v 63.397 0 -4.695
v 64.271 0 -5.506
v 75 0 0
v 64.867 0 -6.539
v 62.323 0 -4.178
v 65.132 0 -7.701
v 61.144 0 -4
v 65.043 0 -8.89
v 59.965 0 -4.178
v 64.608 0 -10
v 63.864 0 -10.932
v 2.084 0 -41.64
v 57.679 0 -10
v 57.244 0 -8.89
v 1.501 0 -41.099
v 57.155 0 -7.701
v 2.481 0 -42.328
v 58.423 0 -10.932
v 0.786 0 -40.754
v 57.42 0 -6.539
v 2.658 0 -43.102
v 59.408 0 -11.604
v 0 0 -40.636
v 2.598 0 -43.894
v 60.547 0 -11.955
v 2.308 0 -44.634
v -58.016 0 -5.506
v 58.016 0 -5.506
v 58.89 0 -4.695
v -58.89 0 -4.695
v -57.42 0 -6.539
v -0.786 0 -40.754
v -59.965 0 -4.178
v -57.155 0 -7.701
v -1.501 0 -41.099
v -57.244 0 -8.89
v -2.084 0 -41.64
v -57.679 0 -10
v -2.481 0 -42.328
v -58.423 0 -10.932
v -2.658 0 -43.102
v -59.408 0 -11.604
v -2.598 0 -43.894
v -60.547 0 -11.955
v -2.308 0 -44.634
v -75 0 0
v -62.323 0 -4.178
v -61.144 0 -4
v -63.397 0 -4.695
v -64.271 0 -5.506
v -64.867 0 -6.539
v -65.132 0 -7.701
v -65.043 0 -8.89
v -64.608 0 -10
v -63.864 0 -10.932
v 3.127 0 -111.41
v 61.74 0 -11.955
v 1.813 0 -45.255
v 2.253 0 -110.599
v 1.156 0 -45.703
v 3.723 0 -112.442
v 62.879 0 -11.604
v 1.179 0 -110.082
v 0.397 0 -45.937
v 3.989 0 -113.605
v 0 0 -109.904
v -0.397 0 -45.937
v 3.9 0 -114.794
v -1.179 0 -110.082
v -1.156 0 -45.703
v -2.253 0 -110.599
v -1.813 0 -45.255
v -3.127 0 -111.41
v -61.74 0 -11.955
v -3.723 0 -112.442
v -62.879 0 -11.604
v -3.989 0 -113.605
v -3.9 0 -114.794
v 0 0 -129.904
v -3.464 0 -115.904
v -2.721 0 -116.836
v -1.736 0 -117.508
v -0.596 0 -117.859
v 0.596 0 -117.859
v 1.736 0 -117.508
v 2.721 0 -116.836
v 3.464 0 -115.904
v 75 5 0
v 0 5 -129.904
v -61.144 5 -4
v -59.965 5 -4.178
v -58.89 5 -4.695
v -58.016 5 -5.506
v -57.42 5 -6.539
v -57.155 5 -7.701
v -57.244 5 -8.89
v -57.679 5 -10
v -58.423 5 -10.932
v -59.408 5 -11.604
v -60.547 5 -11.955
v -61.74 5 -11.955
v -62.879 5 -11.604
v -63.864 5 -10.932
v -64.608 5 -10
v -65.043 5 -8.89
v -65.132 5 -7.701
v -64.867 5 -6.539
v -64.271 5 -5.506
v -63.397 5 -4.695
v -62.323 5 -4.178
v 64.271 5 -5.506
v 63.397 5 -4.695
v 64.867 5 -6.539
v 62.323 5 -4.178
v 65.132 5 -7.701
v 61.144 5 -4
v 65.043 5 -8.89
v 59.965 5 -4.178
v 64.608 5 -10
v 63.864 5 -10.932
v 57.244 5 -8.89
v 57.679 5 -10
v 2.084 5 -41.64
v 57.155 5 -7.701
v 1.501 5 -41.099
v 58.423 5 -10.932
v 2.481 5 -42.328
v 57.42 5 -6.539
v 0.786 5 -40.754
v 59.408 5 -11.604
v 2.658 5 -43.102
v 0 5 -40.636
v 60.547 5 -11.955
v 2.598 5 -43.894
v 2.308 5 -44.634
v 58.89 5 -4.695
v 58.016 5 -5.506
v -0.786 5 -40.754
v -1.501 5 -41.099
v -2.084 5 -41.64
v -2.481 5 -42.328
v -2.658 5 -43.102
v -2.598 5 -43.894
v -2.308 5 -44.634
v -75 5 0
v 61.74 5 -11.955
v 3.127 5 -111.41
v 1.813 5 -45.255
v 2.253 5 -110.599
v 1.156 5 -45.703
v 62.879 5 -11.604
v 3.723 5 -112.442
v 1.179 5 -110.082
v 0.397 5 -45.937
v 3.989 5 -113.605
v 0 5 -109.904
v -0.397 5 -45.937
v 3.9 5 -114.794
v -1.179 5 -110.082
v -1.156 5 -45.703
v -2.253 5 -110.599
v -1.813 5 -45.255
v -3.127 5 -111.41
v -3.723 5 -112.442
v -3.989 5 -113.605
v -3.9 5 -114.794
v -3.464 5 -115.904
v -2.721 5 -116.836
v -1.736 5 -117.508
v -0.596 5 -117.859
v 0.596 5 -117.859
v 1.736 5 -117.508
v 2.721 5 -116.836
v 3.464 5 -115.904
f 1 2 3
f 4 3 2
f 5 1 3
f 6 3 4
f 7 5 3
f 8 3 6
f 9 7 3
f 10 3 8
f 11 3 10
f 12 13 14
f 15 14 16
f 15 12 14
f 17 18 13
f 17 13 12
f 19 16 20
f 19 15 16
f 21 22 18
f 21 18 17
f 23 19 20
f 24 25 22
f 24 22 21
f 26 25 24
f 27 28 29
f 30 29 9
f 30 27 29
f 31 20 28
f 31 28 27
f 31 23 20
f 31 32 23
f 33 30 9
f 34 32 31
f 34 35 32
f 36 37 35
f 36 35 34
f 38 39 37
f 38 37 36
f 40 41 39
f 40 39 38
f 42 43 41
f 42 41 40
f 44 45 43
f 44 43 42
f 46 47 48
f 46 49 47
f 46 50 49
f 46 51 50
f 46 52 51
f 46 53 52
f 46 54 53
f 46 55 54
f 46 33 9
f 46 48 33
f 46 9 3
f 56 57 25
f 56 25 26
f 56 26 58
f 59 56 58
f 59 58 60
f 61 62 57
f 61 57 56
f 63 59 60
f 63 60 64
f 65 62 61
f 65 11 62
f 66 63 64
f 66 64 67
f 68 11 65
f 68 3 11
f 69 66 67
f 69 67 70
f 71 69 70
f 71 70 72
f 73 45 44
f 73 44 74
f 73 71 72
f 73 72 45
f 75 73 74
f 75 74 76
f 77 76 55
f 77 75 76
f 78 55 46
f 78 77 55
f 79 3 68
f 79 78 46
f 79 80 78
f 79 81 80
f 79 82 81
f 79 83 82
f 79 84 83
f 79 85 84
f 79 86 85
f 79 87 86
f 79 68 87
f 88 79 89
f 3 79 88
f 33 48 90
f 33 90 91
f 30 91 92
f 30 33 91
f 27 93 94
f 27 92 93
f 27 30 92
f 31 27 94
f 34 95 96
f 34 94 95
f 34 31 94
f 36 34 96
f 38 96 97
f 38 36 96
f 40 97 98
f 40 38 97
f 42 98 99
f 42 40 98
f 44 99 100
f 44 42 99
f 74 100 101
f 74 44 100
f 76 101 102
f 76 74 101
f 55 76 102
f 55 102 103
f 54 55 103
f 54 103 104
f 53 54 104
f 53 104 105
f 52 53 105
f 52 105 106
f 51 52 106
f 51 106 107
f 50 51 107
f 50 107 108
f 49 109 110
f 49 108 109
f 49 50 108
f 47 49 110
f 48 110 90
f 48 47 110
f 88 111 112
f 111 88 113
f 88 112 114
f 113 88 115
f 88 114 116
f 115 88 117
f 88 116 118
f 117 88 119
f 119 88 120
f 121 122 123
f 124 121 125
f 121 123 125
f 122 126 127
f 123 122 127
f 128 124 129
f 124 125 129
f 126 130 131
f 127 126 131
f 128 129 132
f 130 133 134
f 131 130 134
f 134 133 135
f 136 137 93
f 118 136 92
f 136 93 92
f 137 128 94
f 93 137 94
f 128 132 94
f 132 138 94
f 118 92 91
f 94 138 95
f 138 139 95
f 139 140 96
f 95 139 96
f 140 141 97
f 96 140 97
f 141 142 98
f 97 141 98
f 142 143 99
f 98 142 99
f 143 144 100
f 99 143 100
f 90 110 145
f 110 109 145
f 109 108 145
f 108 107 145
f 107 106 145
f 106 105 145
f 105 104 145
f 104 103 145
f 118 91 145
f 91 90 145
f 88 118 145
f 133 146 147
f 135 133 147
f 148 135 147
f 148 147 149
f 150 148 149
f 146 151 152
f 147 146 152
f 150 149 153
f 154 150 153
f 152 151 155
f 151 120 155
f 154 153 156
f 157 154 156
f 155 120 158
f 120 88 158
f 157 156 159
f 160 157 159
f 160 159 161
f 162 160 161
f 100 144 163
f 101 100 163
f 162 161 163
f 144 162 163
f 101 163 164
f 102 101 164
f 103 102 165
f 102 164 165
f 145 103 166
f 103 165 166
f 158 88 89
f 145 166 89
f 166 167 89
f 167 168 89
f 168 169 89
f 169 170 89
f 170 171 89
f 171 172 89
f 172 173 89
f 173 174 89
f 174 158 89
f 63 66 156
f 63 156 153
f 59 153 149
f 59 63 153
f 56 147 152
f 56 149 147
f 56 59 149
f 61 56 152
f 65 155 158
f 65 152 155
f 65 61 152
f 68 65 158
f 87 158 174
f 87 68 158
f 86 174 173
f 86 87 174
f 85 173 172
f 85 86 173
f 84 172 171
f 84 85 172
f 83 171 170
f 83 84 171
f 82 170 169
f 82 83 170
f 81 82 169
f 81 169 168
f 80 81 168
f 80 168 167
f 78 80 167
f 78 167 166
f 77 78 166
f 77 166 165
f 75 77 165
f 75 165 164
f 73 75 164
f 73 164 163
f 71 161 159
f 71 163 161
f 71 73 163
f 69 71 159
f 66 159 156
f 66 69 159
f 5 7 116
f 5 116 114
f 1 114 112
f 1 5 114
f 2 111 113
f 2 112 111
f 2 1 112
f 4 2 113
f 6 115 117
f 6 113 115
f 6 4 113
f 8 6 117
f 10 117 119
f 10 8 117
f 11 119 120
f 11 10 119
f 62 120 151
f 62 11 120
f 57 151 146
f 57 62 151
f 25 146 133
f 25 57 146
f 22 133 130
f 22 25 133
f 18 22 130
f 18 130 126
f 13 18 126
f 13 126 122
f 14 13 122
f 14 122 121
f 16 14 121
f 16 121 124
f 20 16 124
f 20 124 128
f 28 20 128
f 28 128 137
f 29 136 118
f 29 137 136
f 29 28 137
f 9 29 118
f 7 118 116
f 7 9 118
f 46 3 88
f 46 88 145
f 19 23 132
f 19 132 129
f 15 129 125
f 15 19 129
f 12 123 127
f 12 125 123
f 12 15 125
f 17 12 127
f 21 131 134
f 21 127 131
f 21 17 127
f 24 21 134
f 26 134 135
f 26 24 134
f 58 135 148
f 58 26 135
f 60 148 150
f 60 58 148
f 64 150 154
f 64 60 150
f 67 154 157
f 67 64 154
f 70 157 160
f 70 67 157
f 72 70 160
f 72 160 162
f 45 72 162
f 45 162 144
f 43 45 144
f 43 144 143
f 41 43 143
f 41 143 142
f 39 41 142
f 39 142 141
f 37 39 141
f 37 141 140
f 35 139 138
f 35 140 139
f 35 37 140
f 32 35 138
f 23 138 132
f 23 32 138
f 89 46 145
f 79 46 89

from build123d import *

# Parameters (mm, degrees)
BOSS_EXTRUDE1_DEPTH     = 5
CUT_EXTRUDE1_DEPTH      = 151.083310198
CUT_EXTRUDE1_DEPTH_BACK = 151.083310198
SKETCH2_R               = 4
SKETCH2_R_2             = 2.665209895


with BuildPart() as part:
    # Sketch1 → Boss-Extrude1 (new body)
    with BuildSketch(Plane(origin=(0, 0, 0), x_dir=(1, 0, 0), z_dir=(0, 1, 0))):
        Polygon((0, 129.903810568), (75, 0), (-75, 0), align=None)
    extrude(amount=BOSS_EXTRUDE1_DEPTH)

    # Sketch2 → Cut-Extrude1 (cut, two sides: drawn at the far end of the back side and taken through both)
    with BuildSketch(Plane(origin=(0, 5, 0), x_dir=(1, 0, 0), z_dir=(0, 1, 0)).offset(-CUT_EXTRUDE1_DEPTH_BACK)):
        with Locations(Location((-61.143593539, 8, 0), (0, 0, 270))):
            Circle(SKETCH2_R)
        with Locations(Location((61.143593539, 8, 0), (0, 0, 270))):
            Circle(SKETCH2_R)
        with Locations(Location((0, 113.903810568, 0), (0, 0, 270))):
            Circle(SKETCH2_R)
        with Locations(Location((0, 43.301270189, 0), (0, 0, 270))):
            Circle(SKETCH2_R_2)
    extrude(amount=CUT_EXTRUDE1_DEPTH + CUT_EXTRUDE1_DEPTH_BACK, mode=Mode.SUBTRACT)


solid = part.part
